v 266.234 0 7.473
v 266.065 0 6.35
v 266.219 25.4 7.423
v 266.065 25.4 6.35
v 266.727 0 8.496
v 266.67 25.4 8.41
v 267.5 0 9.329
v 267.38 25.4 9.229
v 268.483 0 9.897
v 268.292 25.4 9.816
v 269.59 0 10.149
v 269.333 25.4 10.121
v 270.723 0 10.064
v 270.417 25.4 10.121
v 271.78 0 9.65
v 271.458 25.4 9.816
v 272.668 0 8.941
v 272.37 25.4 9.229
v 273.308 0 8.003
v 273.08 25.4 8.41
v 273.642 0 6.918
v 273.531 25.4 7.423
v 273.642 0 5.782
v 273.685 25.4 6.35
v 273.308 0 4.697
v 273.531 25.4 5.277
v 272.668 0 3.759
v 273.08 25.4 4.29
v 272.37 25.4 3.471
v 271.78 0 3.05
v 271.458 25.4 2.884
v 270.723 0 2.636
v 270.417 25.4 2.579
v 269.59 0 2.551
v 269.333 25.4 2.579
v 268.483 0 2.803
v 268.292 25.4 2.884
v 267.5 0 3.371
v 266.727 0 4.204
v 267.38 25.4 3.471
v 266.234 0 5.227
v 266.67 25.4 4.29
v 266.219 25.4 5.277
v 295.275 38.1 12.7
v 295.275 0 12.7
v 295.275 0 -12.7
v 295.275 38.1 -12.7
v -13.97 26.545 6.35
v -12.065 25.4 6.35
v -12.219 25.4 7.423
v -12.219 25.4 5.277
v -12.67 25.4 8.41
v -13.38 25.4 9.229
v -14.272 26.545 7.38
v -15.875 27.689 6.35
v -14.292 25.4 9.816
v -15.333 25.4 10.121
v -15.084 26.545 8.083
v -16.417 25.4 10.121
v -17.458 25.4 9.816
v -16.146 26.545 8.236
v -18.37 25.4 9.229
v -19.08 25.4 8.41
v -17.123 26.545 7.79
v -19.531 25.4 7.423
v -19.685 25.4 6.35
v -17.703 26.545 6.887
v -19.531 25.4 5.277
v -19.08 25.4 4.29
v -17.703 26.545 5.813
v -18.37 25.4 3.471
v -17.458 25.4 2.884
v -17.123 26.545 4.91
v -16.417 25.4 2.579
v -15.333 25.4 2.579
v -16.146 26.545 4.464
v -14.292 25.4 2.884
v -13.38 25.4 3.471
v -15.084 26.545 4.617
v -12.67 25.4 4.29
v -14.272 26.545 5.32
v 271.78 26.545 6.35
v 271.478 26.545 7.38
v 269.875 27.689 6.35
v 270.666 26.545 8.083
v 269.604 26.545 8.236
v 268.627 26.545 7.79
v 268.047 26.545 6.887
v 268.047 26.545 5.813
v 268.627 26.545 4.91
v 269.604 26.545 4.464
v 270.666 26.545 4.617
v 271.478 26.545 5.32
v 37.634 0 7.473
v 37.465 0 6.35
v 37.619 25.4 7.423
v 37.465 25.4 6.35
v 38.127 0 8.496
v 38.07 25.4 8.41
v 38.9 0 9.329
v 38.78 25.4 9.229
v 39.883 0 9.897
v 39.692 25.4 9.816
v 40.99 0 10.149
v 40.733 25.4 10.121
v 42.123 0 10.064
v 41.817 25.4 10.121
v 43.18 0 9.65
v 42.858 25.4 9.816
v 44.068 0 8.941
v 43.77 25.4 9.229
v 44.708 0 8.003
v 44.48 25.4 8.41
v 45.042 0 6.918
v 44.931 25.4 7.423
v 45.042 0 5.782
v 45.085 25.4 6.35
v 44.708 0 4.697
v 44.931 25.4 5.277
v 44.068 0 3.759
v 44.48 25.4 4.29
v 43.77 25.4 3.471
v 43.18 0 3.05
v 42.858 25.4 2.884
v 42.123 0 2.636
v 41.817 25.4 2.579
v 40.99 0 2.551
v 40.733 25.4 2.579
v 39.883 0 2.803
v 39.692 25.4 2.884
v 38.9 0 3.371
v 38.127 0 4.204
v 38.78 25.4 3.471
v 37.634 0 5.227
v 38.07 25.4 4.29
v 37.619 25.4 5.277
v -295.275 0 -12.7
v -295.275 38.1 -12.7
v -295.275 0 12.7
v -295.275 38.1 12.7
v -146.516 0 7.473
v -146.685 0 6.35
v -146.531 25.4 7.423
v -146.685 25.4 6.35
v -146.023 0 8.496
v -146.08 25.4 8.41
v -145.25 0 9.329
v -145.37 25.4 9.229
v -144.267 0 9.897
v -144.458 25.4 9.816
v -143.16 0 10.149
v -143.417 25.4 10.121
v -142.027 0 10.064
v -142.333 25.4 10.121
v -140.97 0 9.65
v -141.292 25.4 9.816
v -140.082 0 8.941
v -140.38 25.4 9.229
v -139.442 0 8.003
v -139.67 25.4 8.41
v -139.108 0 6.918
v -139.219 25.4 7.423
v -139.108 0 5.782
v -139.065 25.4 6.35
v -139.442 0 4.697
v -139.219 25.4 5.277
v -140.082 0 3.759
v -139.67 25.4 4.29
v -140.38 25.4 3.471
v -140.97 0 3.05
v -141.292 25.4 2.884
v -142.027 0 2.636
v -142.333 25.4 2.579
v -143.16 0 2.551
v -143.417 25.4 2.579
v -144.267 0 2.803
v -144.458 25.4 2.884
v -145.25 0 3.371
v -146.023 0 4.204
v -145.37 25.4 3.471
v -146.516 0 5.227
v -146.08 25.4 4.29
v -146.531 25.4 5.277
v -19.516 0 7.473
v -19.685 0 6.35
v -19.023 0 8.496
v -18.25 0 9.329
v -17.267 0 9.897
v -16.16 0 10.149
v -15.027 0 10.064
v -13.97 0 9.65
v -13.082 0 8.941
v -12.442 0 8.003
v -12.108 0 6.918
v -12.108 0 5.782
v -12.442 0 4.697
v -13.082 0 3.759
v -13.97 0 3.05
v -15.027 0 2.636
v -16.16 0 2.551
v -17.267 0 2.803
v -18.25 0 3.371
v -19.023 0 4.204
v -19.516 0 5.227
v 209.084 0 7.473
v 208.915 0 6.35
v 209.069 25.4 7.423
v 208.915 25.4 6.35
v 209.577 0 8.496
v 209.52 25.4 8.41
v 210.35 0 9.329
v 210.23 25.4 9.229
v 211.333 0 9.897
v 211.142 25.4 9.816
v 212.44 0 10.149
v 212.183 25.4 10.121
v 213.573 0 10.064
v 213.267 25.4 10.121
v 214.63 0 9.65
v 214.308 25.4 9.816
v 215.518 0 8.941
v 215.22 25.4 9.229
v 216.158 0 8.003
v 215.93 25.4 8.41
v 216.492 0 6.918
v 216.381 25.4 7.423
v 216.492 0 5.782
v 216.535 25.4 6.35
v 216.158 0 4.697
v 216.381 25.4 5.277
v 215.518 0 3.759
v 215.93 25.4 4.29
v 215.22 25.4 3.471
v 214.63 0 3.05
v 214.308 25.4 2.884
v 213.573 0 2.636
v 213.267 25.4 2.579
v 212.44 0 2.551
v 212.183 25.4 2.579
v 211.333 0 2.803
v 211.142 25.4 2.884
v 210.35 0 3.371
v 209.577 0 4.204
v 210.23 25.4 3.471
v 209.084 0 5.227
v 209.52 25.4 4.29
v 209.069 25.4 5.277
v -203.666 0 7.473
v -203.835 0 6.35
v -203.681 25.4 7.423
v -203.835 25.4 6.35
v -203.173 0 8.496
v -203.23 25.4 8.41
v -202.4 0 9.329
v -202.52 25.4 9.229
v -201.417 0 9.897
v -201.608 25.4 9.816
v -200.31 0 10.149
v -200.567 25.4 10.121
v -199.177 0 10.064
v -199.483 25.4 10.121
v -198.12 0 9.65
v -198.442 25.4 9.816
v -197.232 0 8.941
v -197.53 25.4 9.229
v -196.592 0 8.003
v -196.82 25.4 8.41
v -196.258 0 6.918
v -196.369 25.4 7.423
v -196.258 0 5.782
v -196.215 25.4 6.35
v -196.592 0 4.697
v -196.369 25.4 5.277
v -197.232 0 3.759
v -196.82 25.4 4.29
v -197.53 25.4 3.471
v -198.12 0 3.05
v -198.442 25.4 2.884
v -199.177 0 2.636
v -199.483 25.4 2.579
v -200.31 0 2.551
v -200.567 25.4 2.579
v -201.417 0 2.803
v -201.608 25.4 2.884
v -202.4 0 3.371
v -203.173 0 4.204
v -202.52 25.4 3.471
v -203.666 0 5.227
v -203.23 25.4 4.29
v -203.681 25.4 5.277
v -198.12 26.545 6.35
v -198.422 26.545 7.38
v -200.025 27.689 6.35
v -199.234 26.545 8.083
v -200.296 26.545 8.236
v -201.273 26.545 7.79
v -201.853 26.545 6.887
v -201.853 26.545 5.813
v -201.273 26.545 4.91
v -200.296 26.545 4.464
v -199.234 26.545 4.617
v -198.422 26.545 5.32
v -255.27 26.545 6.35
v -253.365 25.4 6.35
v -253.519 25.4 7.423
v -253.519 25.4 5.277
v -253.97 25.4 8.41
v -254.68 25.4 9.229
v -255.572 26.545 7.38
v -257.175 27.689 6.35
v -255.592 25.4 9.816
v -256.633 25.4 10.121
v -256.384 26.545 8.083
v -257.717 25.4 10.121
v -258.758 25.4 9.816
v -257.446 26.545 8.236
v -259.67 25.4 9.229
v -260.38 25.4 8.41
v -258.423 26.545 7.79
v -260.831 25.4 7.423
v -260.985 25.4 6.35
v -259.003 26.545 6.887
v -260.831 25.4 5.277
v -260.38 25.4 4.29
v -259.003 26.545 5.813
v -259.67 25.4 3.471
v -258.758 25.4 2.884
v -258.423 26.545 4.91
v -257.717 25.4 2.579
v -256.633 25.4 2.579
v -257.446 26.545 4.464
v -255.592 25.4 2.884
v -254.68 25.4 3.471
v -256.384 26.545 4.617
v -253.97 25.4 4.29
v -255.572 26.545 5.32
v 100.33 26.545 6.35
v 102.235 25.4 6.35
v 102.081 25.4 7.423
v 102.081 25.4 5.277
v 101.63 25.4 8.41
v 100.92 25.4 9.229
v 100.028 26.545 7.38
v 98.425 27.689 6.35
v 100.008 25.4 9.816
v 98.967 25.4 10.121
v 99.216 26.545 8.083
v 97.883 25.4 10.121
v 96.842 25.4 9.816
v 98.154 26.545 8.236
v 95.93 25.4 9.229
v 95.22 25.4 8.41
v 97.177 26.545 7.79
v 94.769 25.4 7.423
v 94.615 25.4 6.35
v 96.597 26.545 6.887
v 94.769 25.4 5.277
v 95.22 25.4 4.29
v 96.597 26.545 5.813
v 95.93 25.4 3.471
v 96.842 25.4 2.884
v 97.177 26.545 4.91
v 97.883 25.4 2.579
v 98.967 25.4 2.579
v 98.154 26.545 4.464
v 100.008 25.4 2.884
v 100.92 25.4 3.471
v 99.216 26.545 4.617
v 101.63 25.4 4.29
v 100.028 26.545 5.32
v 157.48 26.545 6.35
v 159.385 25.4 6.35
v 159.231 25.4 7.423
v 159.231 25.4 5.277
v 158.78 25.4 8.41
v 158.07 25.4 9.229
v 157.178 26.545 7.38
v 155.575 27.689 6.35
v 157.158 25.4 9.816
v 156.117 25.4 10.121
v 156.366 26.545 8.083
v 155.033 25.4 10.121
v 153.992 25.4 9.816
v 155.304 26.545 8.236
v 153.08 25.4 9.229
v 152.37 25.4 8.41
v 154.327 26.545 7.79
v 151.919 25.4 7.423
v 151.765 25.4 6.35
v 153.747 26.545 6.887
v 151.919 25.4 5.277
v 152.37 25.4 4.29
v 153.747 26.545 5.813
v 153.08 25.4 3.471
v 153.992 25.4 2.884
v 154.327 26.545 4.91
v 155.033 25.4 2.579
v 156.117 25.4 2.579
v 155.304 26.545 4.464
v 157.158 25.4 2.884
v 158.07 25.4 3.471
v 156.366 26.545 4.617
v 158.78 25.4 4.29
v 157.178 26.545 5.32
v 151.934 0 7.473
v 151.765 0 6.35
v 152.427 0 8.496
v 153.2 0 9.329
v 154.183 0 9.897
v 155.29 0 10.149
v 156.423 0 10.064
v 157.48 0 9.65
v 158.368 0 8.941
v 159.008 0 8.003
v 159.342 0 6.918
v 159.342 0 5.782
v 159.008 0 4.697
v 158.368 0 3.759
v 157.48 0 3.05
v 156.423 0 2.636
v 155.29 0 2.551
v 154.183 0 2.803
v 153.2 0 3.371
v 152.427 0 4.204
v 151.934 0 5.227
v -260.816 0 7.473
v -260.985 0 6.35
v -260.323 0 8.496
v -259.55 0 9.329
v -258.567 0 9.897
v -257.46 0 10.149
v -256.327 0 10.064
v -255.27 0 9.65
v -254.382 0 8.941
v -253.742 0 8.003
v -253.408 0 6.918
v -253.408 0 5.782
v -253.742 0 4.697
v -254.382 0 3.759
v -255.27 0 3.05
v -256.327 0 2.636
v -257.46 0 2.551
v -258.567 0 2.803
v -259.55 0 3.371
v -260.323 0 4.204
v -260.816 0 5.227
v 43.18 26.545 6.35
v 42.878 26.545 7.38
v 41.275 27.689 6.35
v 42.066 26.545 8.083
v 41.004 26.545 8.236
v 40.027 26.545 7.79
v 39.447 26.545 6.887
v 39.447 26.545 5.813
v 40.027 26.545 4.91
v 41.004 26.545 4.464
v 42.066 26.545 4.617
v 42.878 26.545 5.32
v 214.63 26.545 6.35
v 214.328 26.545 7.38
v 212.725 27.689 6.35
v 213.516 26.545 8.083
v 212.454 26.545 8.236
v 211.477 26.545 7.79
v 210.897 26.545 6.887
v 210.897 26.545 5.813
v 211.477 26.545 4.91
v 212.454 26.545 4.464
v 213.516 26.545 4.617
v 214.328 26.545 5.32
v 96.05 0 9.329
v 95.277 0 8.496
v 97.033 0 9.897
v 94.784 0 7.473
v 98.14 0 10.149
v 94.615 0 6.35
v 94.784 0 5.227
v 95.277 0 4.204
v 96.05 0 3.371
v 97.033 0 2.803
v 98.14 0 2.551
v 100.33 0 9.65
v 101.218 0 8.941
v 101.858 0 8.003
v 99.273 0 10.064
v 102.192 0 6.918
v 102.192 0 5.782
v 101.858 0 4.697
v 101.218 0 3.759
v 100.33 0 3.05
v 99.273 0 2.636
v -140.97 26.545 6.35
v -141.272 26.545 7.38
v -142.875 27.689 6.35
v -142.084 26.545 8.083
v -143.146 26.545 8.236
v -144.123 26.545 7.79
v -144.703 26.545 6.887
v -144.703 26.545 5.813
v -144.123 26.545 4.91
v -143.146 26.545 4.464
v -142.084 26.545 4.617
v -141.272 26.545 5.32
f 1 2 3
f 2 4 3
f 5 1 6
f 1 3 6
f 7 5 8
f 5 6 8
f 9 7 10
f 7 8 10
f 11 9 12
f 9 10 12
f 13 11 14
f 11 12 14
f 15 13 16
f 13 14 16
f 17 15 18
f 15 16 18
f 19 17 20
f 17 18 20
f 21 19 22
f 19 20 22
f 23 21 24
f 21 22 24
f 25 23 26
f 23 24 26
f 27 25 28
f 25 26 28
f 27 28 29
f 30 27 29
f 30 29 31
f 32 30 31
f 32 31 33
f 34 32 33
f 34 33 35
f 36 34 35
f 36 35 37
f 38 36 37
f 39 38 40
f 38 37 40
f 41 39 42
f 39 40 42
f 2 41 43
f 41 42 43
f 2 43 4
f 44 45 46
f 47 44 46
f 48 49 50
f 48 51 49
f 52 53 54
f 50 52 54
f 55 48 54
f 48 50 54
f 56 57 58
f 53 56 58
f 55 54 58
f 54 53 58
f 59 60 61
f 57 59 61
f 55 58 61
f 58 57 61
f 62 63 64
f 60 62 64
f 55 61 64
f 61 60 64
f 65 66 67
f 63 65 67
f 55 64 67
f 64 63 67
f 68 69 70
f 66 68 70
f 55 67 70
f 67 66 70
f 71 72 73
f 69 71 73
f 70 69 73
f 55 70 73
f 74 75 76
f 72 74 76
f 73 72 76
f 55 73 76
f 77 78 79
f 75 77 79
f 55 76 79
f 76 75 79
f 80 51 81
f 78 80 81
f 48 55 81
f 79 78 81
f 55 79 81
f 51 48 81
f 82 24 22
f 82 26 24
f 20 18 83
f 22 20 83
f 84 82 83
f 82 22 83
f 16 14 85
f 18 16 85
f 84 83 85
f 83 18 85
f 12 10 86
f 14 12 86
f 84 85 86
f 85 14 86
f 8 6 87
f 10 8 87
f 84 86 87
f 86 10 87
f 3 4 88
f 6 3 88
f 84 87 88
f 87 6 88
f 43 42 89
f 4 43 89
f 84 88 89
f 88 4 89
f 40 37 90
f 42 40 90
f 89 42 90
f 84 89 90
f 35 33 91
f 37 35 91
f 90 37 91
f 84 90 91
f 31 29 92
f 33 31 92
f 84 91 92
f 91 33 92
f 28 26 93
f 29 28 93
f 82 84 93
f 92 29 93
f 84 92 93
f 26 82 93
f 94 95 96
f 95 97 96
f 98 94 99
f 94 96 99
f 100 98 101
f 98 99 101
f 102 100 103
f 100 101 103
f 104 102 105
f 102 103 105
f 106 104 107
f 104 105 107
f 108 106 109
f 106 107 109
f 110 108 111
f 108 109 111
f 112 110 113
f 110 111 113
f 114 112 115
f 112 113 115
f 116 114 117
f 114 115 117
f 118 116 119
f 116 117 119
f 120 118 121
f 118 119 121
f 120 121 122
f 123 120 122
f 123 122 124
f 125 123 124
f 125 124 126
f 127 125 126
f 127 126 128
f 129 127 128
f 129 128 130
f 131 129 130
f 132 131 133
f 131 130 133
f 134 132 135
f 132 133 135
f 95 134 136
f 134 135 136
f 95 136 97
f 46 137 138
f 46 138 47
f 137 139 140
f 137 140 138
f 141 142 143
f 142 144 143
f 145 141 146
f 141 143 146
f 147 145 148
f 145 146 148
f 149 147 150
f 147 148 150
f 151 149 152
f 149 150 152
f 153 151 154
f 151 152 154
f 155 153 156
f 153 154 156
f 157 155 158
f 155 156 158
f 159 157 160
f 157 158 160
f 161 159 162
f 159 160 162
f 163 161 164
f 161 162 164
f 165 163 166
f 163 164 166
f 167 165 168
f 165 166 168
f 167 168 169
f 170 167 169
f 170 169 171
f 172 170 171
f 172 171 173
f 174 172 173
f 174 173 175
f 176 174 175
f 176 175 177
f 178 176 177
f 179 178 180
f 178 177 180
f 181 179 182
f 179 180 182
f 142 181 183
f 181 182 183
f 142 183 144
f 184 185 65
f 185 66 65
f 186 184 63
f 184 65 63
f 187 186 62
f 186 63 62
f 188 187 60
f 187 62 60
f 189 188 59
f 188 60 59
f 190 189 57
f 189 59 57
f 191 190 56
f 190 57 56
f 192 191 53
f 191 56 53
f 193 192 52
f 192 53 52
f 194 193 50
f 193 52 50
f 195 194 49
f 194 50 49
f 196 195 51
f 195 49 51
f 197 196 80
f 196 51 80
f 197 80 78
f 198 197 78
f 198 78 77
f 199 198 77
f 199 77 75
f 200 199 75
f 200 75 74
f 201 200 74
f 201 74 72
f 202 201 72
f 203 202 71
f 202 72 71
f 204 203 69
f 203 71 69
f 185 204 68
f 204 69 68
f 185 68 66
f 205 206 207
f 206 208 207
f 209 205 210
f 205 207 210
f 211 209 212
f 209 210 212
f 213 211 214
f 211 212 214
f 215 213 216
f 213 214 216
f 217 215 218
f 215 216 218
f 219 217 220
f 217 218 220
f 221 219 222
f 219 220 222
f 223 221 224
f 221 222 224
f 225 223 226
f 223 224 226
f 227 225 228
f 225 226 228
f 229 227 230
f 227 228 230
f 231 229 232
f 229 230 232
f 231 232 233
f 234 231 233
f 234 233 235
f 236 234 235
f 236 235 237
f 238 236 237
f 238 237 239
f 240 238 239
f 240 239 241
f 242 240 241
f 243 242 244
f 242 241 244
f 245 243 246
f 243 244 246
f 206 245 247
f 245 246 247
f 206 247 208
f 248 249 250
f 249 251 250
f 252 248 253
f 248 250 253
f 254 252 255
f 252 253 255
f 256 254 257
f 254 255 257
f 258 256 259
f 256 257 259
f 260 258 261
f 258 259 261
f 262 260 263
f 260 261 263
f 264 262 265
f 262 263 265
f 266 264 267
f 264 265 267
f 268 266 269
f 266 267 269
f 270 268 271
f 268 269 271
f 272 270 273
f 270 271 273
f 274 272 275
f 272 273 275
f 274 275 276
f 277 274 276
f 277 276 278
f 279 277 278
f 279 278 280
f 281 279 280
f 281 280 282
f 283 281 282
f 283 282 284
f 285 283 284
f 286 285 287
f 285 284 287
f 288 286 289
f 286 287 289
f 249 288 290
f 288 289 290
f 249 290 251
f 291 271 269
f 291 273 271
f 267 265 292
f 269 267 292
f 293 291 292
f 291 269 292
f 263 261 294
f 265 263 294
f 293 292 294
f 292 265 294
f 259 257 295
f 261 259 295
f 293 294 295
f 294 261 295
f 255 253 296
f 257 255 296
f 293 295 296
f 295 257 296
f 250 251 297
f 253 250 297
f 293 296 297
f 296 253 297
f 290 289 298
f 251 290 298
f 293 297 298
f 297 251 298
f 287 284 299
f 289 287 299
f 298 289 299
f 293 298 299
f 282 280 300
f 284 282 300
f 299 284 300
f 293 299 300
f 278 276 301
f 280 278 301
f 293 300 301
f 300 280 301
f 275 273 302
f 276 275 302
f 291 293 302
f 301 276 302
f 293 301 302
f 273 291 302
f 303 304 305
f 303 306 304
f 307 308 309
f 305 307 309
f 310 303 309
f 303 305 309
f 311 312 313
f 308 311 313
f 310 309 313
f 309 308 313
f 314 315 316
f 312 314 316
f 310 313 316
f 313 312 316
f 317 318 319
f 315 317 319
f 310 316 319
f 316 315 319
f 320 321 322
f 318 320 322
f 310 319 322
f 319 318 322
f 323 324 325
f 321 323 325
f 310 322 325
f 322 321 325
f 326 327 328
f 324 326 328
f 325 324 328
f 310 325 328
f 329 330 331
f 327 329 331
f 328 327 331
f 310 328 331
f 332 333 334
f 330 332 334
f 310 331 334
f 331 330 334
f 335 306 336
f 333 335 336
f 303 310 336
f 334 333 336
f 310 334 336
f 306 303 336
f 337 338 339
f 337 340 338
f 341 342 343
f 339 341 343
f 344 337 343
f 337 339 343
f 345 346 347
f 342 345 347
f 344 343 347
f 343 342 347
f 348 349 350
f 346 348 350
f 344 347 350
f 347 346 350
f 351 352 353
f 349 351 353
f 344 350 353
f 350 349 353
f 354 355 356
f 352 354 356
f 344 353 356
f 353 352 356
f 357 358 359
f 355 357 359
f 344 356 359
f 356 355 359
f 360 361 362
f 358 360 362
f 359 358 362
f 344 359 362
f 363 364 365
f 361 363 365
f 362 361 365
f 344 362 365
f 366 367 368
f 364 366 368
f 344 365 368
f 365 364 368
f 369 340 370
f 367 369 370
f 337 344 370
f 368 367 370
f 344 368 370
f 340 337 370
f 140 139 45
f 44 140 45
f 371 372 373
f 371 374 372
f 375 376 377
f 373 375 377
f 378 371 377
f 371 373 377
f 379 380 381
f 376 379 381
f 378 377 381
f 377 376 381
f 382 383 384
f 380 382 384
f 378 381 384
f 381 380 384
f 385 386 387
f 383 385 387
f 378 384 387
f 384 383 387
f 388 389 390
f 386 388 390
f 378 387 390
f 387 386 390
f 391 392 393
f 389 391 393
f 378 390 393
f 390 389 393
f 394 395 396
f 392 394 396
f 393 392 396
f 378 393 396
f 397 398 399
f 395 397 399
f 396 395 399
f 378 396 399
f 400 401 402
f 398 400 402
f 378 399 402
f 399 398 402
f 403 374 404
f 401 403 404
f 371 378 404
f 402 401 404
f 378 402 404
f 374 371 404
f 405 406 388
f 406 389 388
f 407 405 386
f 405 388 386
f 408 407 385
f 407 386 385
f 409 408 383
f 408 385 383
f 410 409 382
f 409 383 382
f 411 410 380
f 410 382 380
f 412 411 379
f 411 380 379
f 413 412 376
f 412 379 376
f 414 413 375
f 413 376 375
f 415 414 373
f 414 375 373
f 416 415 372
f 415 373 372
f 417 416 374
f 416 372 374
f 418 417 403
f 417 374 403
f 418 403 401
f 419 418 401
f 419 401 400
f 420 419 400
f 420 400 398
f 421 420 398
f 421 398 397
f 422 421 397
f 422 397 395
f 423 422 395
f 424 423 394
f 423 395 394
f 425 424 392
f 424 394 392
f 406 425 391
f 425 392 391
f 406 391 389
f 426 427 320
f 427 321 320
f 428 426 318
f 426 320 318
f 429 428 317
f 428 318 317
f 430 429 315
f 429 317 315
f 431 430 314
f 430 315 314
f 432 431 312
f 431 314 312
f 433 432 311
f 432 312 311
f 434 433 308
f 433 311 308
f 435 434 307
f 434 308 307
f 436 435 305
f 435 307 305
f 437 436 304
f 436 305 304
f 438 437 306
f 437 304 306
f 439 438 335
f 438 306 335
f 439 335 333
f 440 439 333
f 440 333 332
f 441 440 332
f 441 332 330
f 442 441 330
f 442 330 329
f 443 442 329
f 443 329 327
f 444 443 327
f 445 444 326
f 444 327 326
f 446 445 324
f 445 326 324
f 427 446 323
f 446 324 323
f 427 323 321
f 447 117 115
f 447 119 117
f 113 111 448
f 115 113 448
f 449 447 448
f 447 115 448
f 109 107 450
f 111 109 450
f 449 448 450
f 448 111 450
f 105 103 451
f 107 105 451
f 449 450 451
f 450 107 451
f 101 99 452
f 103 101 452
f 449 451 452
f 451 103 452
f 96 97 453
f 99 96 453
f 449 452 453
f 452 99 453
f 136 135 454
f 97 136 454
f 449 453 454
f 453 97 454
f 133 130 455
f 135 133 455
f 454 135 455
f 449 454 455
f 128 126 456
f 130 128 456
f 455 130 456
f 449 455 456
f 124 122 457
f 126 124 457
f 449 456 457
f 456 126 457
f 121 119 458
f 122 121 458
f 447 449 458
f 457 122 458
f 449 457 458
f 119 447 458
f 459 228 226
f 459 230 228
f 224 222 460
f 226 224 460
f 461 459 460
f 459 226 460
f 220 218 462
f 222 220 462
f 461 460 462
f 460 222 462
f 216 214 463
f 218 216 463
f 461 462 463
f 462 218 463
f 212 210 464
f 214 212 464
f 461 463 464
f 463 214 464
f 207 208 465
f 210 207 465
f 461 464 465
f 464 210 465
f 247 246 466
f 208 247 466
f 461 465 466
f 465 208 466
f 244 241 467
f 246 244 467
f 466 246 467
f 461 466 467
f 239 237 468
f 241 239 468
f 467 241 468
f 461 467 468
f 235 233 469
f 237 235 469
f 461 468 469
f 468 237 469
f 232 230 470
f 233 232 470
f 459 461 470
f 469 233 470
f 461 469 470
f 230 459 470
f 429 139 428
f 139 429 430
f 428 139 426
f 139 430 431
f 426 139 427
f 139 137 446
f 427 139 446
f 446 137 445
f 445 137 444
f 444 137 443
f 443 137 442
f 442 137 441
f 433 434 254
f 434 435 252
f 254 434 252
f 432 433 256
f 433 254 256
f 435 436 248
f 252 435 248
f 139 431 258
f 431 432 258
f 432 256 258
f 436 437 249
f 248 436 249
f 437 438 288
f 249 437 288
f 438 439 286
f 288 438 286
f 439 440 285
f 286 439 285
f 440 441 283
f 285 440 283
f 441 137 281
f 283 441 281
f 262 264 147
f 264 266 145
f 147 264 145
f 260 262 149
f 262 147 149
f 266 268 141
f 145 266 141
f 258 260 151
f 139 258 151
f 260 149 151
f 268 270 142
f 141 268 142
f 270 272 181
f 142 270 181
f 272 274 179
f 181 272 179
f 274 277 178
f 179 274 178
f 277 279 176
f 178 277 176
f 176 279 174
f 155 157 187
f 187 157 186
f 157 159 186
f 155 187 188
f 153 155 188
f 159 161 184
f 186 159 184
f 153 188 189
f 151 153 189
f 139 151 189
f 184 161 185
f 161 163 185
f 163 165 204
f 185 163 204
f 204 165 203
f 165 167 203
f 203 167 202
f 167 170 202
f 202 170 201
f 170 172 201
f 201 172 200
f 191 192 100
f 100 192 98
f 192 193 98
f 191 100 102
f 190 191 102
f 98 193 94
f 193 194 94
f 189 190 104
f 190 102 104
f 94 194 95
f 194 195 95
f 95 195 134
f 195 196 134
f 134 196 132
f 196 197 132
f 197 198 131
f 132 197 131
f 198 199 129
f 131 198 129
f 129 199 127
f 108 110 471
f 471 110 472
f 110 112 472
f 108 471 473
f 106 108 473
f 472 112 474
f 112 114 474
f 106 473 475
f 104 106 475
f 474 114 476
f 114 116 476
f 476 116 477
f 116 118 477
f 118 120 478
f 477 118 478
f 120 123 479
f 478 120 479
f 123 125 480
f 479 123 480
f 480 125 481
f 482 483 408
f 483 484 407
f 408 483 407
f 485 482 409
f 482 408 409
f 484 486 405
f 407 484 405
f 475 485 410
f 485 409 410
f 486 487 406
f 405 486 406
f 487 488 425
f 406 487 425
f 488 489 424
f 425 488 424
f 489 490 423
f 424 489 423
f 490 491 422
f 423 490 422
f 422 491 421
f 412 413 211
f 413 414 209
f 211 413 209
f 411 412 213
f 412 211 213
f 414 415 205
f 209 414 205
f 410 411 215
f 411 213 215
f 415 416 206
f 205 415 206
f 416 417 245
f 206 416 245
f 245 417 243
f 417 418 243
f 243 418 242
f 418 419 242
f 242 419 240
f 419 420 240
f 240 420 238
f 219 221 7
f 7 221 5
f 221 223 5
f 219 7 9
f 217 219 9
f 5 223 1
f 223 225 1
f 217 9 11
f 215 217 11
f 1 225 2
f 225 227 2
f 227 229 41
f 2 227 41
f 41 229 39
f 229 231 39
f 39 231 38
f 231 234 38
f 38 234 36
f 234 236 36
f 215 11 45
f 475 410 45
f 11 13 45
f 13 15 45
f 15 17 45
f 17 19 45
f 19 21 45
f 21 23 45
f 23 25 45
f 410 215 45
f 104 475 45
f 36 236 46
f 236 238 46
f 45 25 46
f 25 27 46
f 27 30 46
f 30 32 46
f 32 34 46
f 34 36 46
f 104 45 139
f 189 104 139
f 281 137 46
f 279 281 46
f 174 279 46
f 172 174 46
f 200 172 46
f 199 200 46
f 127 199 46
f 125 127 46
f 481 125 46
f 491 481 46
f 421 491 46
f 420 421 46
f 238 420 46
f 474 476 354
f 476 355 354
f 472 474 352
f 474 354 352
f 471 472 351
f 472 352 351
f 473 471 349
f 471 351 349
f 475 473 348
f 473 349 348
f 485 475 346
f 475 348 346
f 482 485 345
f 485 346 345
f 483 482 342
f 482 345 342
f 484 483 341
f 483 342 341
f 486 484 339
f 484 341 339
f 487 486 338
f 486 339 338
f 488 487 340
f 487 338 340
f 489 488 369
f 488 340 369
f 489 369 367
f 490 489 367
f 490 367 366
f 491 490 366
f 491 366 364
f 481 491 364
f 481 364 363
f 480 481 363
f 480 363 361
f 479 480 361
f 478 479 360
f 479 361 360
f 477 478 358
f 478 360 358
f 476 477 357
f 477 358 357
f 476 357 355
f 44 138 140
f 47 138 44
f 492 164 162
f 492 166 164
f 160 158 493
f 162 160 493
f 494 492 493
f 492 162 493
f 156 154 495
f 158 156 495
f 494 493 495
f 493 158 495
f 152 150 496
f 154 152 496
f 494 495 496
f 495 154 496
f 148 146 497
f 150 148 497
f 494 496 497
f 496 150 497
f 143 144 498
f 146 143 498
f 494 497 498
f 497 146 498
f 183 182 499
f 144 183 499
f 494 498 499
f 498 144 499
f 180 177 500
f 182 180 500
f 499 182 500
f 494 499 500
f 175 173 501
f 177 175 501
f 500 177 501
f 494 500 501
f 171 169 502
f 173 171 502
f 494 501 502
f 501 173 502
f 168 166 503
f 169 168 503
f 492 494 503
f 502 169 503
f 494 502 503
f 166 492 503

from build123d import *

# Parameters (mm, degrees)
SKETCH1_W                     = 590.55
SKETCH1_H                     = 25.4
BOSS_EXTRUDE1_DEPTH           = 38.1
F_94_0_3_DIAMETER_HOLE1_D     = 7.62
F_94_0_3_DIAMETER_HOLE1_DEPTH = 25.4
F_94_0_3_DIAMETER_HOLE1_TIP   = 2.289278958


with BuildPart() as part:
    # Sketch1 → Boss-Extrude1 (new body)
    with BuildSketch(Plane(origin=(0, 0, 0), x_dir=(1, 0, 0), z_dir=(0, 1, 0))):
        Rectangle(SKETCH1_W, SKETCH1_H)
    extrude(amount=BOSS_EXTRUDE1_DEPTH)

    # #94 (0.3) Diameter Hole1
    with Locations(Plane.XZ):
        with Locations((269.875, 6.35), (212.725, 6.35), (155.575, 6.35), (-142.875, 6.35), (98.425, 6.35), (41.275, 6.35), (-15.875, 6.35), (-200.025, 6.35), (-257.175, 6.35)):
            Hole(F_94_0_3_DIAMETER_HOLE1_D / 2, depth=F_94_0_3_DIAMETER_HOLE1_DEPTH)
            with Locations((0, 0, -(F_94_0_3_DIAMETER_HOLE1_DEPTH + F_94_0_3_DIAMETER_HOLE1_TIP / 2))):  # 118° drill point
                Cone(0, F_94_0_3_DIAMETER_HOLE1_D / 2, F_94_0_3_DIAMETER_HOLE1_TIP, mode=Mode.SUBTRACT)


solid = part.part
